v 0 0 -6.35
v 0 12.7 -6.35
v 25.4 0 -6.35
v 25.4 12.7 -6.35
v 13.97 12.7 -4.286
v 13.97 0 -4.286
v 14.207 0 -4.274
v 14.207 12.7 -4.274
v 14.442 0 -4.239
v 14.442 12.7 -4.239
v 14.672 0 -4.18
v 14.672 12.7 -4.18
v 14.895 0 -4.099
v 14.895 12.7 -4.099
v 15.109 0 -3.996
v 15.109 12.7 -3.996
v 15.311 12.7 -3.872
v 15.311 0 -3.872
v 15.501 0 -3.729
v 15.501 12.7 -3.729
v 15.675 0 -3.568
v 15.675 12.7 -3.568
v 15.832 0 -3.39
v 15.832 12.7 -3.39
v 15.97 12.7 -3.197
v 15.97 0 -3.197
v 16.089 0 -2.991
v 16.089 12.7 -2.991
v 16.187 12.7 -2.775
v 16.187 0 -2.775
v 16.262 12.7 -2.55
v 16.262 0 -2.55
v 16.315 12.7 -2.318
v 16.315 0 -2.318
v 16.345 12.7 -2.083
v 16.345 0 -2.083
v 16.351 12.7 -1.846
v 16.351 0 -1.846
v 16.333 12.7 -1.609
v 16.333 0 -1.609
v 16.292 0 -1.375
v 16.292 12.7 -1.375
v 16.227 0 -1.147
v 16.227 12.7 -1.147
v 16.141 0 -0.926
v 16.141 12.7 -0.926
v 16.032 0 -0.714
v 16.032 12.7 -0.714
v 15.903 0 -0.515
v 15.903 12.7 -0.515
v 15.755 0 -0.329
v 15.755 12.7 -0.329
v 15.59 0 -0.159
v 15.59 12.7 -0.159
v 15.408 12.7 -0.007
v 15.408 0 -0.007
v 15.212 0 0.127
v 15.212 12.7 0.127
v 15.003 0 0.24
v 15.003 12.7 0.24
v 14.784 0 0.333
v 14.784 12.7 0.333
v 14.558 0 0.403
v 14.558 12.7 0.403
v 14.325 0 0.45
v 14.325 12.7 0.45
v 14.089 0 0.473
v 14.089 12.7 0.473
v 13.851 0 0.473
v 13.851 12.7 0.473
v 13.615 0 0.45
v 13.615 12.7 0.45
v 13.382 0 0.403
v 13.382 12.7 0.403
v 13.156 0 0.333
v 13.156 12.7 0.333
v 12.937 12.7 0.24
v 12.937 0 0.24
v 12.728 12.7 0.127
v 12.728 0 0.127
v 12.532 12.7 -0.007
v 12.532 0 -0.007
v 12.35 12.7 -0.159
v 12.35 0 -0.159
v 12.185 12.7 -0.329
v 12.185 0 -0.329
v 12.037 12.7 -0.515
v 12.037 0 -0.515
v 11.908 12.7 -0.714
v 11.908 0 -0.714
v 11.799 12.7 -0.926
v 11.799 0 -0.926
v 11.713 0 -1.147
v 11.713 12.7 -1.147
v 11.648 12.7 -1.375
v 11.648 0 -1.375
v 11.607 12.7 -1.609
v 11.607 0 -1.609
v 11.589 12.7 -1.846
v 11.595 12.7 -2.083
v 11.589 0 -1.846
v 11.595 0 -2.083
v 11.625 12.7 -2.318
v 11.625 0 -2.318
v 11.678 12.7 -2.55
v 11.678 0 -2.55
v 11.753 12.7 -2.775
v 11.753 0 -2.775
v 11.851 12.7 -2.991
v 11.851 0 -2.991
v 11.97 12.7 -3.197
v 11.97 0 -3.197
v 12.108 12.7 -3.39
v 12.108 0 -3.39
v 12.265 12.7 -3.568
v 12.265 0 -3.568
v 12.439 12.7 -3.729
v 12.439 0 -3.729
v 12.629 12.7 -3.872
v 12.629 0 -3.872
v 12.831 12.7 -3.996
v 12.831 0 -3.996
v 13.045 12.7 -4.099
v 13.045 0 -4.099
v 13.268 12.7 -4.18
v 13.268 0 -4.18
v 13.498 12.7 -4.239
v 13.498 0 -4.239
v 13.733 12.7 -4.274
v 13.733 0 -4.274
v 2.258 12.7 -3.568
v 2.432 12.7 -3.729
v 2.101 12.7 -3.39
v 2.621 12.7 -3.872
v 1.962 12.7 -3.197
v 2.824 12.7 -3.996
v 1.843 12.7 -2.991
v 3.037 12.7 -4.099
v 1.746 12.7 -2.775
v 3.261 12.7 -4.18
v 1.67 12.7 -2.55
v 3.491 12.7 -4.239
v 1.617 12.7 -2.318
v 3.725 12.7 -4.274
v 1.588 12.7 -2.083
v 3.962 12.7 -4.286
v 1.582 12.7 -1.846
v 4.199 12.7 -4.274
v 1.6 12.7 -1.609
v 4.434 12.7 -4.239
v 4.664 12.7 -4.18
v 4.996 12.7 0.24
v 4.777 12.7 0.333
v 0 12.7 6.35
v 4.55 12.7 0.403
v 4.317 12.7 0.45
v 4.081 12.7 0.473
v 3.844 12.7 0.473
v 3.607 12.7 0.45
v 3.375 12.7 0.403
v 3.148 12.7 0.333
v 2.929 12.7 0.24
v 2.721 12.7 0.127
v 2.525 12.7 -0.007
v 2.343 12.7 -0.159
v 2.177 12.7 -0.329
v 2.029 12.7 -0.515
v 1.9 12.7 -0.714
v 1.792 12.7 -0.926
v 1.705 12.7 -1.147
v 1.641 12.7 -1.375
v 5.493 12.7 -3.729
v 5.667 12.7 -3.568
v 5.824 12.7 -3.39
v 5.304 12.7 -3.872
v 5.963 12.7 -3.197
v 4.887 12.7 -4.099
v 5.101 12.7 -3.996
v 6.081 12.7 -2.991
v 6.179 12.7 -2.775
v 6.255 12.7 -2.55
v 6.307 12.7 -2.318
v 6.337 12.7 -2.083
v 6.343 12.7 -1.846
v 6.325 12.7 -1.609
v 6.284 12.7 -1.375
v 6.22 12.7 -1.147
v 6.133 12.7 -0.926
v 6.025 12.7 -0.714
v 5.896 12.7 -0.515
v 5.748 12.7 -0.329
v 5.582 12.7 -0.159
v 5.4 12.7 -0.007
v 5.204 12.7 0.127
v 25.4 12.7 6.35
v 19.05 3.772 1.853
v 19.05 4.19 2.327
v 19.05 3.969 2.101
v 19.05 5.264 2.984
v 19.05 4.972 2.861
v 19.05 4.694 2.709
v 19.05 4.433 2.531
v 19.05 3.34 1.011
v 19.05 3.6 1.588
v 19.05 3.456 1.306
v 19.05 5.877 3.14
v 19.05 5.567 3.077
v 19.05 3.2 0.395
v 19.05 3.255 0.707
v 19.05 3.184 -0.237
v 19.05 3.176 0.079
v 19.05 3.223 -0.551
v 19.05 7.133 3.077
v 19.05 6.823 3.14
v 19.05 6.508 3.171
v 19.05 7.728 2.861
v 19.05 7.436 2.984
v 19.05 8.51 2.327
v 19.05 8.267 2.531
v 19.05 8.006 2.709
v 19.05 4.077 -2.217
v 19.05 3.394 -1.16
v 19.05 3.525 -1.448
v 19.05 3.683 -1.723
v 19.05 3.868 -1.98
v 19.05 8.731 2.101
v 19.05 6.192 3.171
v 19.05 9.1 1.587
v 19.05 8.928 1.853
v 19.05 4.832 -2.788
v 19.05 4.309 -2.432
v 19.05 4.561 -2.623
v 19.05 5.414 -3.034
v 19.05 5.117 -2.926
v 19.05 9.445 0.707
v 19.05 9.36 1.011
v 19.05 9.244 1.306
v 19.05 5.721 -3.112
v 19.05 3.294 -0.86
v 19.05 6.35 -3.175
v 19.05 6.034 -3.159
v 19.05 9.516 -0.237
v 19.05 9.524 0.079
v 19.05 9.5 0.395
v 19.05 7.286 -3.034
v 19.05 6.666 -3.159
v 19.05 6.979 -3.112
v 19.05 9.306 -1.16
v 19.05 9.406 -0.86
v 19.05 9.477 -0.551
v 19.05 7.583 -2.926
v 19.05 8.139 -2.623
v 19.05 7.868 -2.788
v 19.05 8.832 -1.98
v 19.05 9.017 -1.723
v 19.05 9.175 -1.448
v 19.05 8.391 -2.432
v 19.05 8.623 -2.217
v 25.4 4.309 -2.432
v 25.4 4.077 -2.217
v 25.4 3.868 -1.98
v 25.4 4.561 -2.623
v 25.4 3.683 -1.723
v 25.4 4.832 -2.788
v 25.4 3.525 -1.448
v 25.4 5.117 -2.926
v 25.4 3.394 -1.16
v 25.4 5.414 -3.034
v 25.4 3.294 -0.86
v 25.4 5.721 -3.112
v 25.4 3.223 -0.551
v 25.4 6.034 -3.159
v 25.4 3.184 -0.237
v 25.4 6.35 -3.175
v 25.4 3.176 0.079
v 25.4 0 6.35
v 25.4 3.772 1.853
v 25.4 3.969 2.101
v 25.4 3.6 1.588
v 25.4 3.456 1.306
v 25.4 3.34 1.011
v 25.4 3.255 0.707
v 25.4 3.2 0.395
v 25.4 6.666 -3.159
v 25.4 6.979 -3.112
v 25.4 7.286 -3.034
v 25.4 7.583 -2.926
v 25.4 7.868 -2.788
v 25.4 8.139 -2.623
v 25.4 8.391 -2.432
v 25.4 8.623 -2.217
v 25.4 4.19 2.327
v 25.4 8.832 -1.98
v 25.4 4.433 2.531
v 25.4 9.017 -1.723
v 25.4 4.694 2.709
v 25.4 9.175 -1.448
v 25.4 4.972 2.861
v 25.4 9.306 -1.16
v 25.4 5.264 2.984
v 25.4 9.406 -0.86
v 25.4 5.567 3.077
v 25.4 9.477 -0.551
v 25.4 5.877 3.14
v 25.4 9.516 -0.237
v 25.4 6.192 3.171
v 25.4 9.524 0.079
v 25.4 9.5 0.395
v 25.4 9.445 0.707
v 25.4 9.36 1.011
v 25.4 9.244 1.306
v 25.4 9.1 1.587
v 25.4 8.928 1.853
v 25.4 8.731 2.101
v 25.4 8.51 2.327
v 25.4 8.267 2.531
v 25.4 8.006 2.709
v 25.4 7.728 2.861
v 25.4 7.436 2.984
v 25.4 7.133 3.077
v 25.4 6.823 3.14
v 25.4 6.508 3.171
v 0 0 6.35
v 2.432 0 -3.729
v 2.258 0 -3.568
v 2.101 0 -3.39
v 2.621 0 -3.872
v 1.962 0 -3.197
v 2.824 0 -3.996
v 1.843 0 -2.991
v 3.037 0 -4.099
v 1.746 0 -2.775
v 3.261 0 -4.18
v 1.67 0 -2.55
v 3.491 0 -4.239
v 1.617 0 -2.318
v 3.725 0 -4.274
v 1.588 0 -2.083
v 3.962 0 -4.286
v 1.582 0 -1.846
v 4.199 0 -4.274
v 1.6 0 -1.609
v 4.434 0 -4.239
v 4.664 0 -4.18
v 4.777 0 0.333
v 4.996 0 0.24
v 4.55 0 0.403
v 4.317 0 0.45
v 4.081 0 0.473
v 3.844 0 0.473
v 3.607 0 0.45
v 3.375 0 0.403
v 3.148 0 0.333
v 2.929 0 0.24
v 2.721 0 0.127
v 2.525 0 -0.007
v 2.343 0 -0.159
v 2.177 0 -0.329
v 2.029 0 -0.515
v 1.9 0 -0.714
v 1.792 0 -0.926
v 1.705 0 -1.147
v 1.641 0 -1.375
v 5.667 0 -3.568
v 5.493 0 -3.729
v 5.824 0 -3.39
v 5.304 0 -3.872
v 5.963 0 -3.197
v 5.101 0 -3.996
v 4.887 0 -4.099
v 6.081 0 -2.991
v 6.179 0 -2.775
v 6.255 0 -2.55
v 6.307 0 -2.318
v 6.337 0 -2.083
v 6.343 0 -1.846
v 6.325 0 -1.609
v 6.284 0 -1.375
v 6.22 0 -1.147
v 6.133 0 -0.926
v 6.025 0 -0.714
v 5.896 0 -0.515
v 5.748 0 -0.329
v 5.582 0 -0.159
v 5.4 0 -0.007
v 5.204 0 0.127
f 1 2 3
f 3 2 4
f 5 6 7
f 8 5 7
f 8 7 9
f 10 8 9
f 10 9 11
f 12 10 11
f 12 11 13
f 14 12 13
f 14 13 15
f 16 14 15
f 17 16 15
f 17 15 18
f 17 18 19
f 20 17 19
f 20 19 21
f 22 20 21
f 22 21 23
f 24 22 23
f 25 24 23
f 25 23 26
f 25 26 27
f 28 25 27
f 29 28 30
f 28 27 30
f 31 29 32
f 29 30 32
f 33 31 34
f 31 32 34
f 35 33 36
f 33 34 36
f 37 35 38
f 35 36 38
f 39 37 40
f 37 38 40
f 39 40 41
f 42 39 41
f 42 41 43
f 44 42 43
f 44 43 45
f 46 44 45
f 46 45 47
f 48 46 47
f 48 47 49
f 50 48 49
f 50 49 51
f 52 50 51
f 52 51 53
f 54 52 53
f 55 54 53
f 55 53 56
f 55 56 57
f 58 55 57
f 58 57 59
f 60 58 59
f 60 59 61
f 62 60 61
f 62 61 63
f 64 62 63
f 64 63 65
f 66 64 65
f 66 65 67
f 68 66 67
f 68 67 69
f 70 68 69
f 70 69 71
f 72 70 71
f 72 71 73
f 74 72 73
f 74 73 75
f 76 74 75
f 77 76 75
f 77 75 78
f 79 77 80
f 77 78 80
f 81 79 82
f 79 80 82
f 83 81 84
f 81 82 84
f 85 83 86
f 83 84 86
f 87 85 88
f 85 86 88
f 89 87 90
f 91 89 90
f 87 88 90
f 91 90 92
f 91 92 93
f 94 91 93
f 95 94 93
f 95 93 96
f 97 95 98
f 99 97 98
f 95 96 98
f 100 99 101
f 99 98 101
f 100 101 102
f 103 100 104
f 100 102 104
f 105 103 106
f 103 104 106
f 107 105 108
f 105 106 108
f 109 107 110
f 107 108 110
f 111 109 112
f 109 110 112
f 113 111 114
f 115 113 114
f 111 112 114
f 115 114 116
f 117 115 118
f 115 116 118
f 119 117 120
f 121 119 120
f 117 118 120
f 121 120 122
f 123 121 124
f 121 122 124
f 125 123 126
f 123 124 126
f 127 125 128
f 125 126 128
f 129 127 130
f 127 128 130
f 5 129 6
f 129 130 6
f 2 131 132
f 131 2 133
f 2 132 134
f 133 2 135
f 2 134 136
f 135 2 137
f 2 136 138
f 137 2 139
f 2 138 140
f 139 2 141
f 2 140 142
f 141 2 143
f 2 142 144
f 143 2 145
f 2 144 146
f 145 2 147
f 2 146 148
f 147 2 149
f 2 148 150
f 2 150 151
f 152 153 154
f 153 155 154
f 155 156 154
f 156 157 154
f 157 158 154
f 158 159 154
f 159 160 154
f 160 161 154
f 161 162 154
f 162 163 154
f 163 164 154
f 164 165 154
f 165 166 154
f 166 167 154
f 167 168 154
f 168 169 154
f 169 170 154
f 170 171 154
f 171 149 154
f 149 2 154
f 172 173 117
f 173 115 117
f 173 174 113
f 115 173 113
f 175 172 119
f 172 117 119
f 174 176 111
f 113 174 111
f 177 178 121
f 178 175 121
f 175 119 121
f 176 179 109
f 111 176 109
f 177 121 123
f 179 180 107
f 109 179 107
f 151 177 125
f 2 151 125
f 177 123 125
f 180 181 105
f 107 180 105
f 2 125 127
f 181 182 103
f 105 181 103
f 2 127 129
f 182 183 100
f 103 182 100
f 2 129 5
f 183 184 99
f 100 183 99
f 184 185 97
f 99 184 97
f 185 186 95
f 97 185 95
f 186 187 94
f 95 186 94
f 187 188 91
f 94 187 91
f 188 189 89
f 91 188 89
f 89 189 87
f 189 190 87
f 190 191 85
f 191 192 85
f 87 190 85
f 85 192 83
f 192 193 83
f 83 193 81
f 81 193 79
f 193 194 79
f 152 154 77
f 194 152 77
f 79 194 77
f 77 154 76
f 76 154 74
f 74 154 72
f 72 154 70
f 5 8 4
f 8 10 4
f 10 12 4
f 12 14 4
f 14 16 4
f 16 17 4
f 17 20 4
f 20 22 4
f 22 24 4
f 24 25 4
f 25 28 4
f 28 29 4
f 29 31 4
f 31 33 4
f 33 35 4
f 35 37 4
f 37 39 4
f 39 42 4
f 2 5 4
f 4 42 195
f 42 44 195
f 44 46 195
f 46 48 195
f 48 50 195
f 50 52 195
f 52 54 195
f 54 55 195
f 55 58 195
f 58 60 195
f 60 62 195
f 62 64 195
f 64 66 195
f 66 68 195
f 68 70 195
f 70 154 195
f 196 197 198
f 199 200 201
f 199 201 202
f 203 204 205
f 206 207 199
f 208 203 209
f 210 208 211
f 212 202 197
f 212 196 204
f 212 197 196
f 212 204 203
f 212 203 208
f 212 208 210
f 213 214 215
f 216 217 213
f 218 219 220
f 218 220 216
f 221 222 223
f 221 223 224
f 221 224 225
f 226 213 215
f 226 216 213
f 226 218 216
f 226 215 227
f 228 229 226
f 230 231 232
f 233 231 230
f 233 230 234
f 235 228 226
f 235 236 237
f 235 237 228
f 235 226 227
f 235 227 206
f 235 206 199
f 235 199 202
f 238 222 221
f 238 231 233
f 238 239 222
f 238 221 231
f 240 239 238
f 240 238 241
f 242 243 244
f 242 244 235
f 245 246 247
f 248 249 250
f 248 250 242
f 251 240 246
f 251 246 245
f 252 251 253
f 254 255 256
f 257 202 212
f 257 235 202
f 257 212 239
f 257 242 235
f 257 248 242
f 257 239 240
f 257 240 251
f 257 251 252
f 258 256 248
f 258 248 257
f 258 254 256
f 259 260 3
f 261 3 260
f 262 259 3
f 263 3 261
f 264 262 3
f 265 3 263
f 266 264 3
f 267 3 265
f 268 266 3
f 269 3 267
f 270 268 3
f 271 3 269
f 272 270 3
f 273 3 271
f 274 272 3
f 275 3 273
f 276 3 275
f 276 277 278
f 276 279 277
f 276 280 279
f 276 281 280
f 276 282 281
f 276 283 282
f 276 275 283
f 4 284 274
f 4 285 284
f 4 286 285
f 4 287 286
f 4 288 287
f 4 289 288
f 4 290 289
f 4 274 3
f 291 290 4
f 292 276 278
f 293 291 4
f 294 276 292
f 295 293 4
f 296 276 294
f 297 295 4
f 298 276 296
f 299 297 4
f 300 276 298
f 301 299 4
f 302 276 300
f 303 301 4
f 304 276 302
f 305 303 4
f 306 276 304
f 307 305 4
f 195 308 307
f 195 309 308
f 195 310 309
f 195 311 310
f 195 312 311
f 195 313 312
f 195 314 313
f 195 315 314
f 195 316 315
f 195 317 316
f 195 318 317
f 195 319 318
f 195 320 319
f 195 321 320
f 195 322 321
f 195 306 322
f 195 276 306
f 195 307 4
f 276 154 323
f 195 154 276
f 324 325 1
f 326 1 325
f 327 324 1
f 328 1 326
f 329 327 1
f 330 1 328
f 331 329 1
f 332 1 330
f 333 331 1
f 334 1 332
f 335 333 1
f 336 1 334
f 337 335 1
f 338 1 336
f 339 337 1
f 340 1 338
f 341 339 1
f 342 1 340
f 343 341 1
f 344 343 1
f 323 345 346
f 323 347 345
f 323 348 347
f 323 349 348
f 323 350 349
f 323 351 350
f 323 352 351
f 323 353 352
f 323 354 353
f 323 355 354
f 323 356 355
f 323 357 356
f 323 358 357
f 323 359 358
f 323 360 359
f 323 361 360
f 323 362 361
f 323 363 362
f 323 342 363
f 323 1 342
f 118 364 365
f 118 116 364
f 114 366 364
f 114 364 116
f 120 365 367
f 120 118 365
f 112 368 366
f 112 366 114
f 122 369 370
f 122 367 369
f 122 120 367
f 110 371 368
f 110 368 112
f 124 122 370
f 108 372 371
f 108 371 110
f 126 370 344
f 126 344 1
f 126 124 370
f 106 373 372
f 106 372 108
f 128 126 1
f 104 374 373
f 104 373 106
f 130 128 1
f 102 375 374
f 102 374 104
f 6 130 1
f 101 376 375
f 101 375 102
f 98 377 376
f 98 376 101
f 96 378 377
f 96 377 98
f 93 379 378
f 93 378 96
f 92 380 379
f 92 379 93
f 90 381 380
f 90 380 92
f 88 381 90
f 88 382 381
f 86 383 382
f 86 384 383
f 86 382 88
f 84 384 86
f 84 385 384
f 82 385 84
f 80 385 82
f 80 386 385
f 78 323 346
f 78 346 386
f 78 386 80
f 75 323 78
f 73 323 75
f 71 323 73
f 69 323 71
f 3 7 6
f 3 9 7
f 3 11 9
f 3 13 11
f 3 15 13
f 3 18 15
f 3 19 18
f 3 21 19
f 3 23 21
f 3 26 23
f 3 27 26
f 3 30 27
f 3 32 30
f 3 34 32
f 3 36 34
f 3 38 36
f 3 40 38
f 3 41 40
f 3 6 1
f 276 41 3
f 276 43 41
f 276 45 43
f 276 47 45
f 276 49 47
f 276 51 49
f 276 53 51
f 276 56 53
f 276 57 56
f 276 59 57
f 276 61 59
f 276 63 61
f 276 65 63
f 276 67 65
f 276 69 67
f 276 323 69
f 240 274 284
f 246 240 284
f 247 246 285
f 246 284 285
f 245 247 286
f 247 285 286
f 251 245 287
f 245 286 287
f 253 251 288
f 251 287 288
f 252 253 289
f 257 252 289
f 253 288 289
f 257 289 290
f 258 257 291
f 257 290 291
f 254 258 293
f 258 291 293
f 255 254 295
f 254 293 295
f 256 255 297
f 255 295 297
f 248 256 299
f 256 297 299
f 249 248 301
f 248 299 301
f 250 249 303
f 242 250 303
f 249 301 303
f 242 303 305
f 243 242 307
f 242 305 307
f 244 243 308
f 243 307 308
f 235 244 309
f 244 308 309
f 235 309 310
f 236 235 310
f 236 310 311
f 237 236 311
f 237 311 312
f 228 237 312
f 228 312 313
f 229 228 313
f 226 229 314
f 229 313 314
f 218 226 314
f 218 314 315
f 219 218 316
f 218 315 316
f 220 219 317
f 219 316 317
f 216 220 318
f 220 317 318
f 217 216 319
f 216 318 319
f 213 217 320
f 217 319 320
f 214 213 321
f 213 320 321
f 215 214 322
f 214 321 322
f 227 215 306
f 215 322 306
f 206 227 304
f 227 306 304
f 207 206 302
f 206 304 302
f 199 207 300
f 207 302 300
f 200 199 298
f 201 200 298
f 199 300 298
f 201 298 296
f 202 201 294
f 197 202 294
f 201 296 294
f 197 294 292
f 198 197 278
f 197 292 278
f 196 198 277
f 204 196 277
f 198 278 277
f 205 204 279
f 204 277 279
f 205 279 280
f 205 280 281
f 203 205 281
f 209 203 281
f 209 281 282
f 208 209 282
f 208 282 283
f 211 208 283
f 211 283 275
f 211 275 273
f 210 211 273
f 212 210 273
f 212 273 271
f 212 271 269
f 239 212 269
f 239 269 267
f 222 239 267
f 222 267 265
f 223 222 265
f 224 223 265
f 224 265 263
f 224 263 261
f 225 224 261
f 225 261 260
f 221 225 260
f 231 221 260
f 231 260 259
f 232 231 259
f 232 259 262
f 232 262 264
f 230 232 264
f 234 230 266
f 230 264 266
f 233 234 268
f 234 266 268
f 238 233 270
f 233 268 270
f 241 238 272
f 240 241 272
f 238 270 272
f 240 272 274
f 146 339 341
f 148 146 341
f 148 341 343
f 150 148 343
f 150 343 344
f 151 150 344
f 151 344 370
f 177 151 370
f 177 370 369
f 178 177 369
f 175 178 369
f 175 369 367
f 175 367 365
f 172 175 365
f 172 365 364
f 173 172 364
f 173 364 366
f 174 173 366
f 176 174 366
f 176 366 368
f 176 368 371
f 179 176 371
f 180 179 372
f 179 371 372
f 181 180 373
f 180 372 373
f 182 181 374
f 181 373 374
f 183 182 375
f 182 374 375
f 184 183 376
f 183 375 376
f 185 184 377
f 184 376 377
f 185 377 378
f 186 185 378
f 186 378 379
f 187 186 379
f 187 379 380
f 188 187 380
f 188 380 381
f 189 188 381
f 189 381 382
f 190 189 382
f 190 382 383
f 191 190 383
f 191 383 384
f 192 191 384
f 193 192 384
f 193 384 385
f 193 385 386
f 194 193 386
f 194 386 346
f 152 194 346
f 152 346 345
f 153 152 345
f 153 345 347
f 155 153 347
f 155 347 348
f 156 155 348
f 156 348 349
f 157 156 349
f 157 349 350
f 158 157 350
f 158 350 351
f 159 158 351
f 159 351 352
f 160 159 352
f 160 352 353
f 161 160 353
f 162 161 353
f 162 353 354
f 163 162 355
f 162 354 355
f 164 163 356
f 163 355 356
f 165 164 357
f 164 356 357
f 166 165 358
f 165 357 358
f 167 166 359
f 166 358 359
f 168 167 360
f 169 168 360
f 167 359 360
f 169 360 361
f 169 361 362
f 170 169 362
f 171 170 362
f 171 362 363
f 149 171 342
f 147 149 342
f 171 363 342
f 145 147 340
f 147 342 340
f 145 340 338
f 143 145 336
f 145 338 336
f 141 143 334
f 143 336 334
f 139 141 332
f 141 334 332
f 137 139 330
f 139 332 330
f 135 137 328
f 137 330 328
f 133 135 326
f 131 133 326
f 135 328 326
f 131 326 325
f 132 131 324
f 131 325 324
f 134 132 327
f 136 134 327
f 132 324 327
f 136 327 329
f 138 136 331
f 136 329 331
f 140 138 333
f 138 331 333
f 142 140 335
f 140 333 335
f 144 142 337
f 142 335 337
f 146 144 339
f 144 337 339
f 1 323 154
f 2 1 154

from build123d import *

# Parameters (mm, degrees)
SKETCH1_W                   = 25.4
SKETCH1_H                   = 12.7
BOSS_EXTRUDE1_DEPTH         = 6.35
F_3_16_0_1875_DOWEL_HOLE1_D = 4.7625
SKETCH6_R                   = 3.175
CUT_EXTRUDE1_DEPTH          = 6.35


with BuildPart() as part:
    # Sketch1 → Boss-Extrude1 (new, symmetric)
    with BuildSketch(Plane.XY):
        with Locations((12.7, 6.35)):
            Rectangle(SKETCH1_W, SKETCH1_H)
    extrude(amount=BOSS_EXTRUDE1_DEPTH, both=True)

    # 3/16 (0.1875) Dowel Hole1 (through all)
    with Locations(Plane(origin=(13.97, 12.7, -1.905), x_dir=(0, 0, 1), z_dir=(0, 1, 0))):
        with Locations((0, 0), (0, -10.0076)):
            Hole(F_3_16_0_1875_DOWEL_HOLE1_D / 2)

    # Sketch6 → Cut-Extrude1 (cut)
    with BuildSketch(Plane(origin=(25.4, 0, 0), x_dir=(0, 0, -1), z_dir=(1, 0, 0))):
        with Locations((0, 6.35)):
            Circle(SKETCH6_R)
    extrude(amount=-CUT_EXTRUDE1_DEPTH, mode=Mode.SUBTRACT)


solid = part.part
